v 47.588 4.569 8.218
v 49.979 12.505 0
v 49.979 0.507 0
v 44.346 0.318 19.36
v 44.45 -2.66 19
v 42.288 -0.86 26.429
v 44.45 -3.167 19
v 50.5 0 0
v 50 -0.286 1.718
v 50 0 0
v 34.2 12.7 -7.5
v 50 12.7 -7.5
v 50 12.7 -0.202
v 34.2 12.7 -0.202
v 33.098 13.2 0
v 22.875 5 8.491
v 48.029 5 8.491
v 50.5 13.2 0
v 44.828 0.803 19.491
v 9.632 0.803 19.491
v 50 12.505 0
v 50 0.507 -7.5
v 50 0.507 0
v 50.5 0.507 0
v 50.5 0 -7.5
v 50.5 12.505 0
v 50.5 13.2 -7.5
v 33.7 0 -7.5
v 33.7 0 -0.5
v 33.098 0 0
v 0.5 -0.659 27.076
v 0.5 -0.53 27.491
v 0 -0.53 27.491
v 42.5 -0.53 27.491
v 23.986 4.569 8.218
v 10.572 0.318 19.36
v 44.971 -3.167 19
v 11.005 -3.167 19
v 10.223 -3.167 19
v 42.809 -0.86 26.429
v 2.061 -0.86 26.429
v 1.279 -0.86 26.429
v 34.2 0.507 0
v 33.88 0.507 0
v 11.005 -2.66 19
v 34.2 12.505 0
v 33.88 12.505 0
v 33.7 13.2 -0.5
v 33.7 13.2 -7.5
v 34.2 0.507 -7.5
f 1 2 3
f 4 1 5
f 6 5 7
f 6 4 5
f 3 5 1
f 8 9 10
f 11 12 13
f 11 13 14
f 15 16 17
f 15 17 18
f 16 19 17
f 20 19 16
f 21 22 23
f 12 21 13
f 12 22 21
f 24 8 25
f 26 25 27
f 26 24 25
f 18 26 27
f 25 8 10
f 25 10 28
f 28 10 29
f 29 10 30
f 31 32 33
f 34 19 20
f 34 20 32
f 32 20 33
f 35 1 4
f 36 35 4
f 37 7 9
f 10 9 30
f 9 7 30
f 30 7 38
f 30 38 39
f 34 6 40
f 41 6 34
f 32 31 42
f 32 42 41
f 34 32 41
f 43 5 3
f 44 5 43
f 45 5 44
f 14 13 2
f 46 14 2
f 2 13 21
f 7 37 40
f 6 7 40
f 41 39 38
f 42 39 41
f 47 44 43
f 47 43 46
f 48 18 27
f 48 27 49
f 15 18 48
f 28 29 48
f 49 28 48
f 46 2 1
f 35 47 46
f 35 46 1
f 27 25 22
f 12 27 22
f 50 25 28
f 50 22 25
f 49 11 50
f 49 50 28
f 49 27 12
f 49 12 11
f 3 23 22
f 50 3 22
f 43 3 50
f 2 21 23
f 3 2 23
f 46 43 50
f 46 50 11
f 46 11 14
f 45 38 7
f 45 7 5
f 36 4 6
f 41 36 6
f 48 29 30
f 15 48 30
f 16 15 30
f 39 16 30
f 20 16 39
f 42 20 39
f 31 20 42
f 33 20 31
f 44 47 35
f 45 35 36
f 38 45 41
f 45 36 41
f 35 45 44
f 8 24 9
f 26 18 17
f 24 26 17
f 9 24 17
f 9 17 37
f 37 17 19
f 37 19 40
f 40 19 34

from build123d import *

# Parameters (mm, degrees)
SIDE_BASE_DEPTH                    = 0.5
SIDE_BASE_2_COUNT                  = 2
SIDE_BASE_2_PITCH                  = 50
FRONT_BACK_WALLS_REACH             = 60.566
BASE_SKETCH_W                      = 50.5
BASE_SKETCH_H                      = 13.2
BASE_SKETCH_W_2                    = 15.8
BASE_SKETCH_H_2                    = 11.998021326
BASE_DEPTH                         = 0.5
ATTACHMENT_BASE_SKETCH_W           = 16.8
ATTACHMENT_BASE_SKETCH_H           = 13.2
ATTACHMENT_BASE_SKETCH_W_2         = 15.8
ATTACHMENT_BASE_SKETCH_H_2         = 11.998021326
ATTACHMENT_BASE_DEPTH              = 7
PIPE_TOP_EXTRA_CUTAWAY_REACH       = 64.84
SKETCH11_W                         = 15.8
SKETCH11_H                         = 0.195081796
SKETCH1_W                          = 15.8
SKETCH1_H                          = 12.193103122
FAN_BASE_DEPTH                     = 0.1
LEFT_RIGHT_WALL_REMOVAL_DEPTH      = 59.566323483
LEFT_RIGHT_WALL_REMOVAL_DEPTH_BACK = 59.566323483
SKETCH6_W                          = 28.631700026
SKETCH6_H                          = 16.366666667
CUTAWAY_LEFT_DEPTH                 = 53.811785181
LEFT_WALL_DEPTH                    = 0.520740187
SKETCH9_W                          = 43.808738797
SKETCH9_H                          = 16.366666667
CUTAWAY_RIGHT_DEPTH                = 46.956653807
RIGHT_WALL_DEPTH                   = 0.781709206


with BuildPart() as part:
    # Side base sketch → Side base (new body)
    with BuildSketch(Plane.ZY):
        Polygon((0, 13.2), (8.491348573, 5), (19.491348573, 0.8030407), (27.491348573, -0.530292633), (19, -3.166666667), (6, -1), (0, 0), align=None)
    extrude(amount=-SIDE_BASE_DEPTH)


with BuildPart() as side_base_2_1:
    # Side base 2: pattern copy
    add(part.part.moved(Location(Vector(1, 0, 0) * (1 * SIDE_BASE_2_PITCH))))

    # Wall base sketch → Front back walls (add, up to next)
    with BuildSketch(Plane(origin=(0.5, 0, 0), x_dir=(0, 0, -1), z_dir=(1, 0, 0)), mode=Mode.PRIVATE) as front_back_walls_sk1:
        Polygon((0, 12.504918204), (-8.217574488, 4.569298766), (-19.359827502, 0.318064001), (-26.428993119, -0.860130268), (-27.491348573, -0.530292633), (-19.491348573, 0.8030407), (-8.491348573, 5), (0, 13.2), align=None)
    front_back_walls_tool1 = extrude(front_back_walls_sk1.sketch, amount=FRONT_BACK_WALLS_REACH, mode=Mode.PRIVATE) - side_base_2_1.part
    # Wall base sketch → Front back walls (add, up to next)
    with BuildSketch(Plane(origin=(0.5, 0, 0), x_dir=(0, 0, -1), z_dir=(1, 0, 0)), mode=Mode.PRIVATE) as front_back_walls_sk2:
        Polygon((0, 0.506896878), (-19, -2.659769789), (-19, -3.166666667), (0, 0), align=None)
    front_back_walls_tool2 = extrude(front_back_walls_sk2.sketch, amount=FRONT_BACK_WALLS_REACH, mode=Mode.PRIVATE) - side_base_2_1.part

    add(part.part)  # Front back walls merges part
    add(front_back_walls_tool1.solids().sort_by_distance((0.5, 8.759227, 4.323285))[0])
    add(front_back_walls_tool2.solids().sort_by_distance((0.5, -1.329885, 9.5))[0])

    # Base sketch → Base (add)
    with BuildSketch(Plane(origin=(0, 0, 0), x_dir=(-1, 0, 0), z_dir=(0, 0, -1))):
        with Locations((-25.25, 6.6)):
            Rectangle(BASE_SKETCH_W, BASE_SKETCH_H)
        with Locations((-42.1, 6.505907541)):
            Rectangle(BASE_SKETCH_W_2, BASE_SKETCH_H_2, mode=Mode.SUBTRACT)
    extrude(amount=BASE_DEPTH)

    # Attachment base sketch → Attachment base (add)
    with BuildSketch(Plane(origin=(0, 0, -0.5), x_dir=(-1, 0, 0), z_dir=(0, 0, -1))):
        with Locations((-42.1, 6.6)):
            Rectangle(ATTACHMENT_BASE_SKETCH_W, ATTACHMENT_BASE_SKETCH_H)
        with Locations((-42.1, 6.505907541)):
            Rectangle(ATTACHMENT_BASE_SKETCH_W_2, ATTACHMENT_BASE_SKETCH_H_2, mode=Mode.SUBTRACT)
    extrude(amount=ATTACHMENT_BASE_DEPTH)

    # Pipe top extra cutaway: up to this plane
    pipe_top_extra_cutaway_end = Plane(origin=(500000, 12.504918204, 0), z_dir=(0, 0.7193398003386524, 0.694658370458996))
    # Sketch11 → Pipe top extra cutaway (cut, up to the surface)
    with BuildSketch(Plane(origin=(0, 0, -7.5), x_dir=(-1, 0, 0), z_dir=(0, 0, -1)), mode=Mode.PRIVATE) as pipe_top_extra_cutaway_sk1:
        with Locations((-42.1, 12.602459102)):
            Rectangle(SKETCH11_W, SKETCH11_H)
    pipe_top_extra_cutaway_tool1 = split(extrude(pipe_top_extra_cutaway_sk1.sketch, amount=-PIPE_TOP_EXTRA_CUTAWAY_REACH, mode=Mode.PRIVATE), bisect_by=pipe_top_extra_cutaway_end, keep=Keep.BOTH, mode=Mode.PRIVATE)
    add(pipe_top_extra_cutaway_tool1.solids().sort_by_distance((42.1, 12.602459, -7.5))[0], mode=Mode.SUBTRACT)

    # Sketch4 → Left right wall removal (cut, two sides: drawn at the far end of the back side and taken through both)
    with BuildSketch(Plane(origin=(0.5, 0, 0), x_dir=(0, 0, -1), z_dir=(1, 0, 0)).offset(-LEFT_RIGHT_WALL_REMOVAL_DEPTH_BACK)):
        Polygon((-26.428993119, -0.860130268), (-19, -3.166666667), (-19, -2.659769789), (0, 0.506896878), (0, 12.504918204), (-8.217574488, 4.569298766), (-19.359827502, 0.318064001), align=None)
    extrude(amount=LEFT_RIGHT_WALL_REMOVAL_DEPTH + LEFT_RIGHT_WALL_REMOVAL_DEPTH_BACK, mode=Mode.SUBTRACT)

    # Sketch6 → Cutaway left (cut, through all)
    with BuildSketch(Plane(origin=(46.557451165, 0, 13.548248036), x_dir=(0.27941058312270783, 0, -0.9601717169543313), z_dir=(0.9601717169543312, 0, 0.2794105831227078))):
        with Locations((-0.205615565, 5.016666667)):
            Rectangle(SKETCH6_W, SKETCH6_H)
    extrude(amount=CUTAWAY_LEFT_DEPTH, mode=Mode.SUBTRACT)

    # Sketch7 → Left wall (add, along a direction that is not the sketch's normal)
    with BuildSketch(Plane(origin=(46.557451165, 0, 13.548248036), x_dir=(0.27941058312270806, 0, -0.9601717169543312), z_dir=(0.9601717169543312, 0, 0.27941058312270806))):
        Polygon((-5.67789268, -2.659769789), (-5.677892681, -3.166666667), (-13.415043221, -0.860130268), (-6.052645962, 0.318064001), (5.551791887, 4.569298766), (14.110234448, 12.504918204), (14.110234448, 0.506896878), align=None)
    extrude(amount=-LEFT_WALL_DEPTH, dir=(1, 0, 0))

    # Sketch9 → Cutaway right (cut, through all)
    with BuildSketch(Plane(origin=(13.512268511, 0, 16.268006796), x_dir=(0.7692529145051232, 0, -0.63894440566091), z_dir=(0.63894440566091, 0, 0.7692529145051232))):
        with Locations((4.338926024, 5.016666667)):
            Rectangle(SKETCH9_W, SKETCH9_H)
    extrude(amount=-CUTAWAY_RIGHT_DEPTH, mode=Mode.SUBTRACT)

    # Sketch10 → Right wall (add, along a direction that is not the sketch's normal)
    with BuildSketch(Plane(origin=(13.512268511, 0, 16.268006796), x_dir=(-0.7692529145051233, -2.5697854420108344e-15, 0.63894440566091), z_dir=(-0.6389444056609099, 0, -0.7692529145051232))):
        Polygon((-25.460754726, 12.504918204), (-25.460754725, 0.506896878), (4.275791728, -2.659769789), (4.275791728, -3.166666667), (15.902770622, -0.860130268), (4.838951055, 0.318064001), (-12.599581805, 4.569298766), align=None)
    extrude(amount=-RIGHT_WALL_DEPTH, dir=(-1, 0, 0))


with BuildPart() as body_2:
    # Sketch1 → Fan base (new body)
    with BuildSketch(Plane(origin=(0, 0, -7.5), x_dir=(-1, 0, 0), z_dir=(0, 0, -1))):
        with Locations((-42.1, 6.603448439)):
            Rectangle(SKETCH1_W, SKETCH1_H)
    extrude(amount=FAN_BASE_DEPTH)


solid = side_base_2_1.part
